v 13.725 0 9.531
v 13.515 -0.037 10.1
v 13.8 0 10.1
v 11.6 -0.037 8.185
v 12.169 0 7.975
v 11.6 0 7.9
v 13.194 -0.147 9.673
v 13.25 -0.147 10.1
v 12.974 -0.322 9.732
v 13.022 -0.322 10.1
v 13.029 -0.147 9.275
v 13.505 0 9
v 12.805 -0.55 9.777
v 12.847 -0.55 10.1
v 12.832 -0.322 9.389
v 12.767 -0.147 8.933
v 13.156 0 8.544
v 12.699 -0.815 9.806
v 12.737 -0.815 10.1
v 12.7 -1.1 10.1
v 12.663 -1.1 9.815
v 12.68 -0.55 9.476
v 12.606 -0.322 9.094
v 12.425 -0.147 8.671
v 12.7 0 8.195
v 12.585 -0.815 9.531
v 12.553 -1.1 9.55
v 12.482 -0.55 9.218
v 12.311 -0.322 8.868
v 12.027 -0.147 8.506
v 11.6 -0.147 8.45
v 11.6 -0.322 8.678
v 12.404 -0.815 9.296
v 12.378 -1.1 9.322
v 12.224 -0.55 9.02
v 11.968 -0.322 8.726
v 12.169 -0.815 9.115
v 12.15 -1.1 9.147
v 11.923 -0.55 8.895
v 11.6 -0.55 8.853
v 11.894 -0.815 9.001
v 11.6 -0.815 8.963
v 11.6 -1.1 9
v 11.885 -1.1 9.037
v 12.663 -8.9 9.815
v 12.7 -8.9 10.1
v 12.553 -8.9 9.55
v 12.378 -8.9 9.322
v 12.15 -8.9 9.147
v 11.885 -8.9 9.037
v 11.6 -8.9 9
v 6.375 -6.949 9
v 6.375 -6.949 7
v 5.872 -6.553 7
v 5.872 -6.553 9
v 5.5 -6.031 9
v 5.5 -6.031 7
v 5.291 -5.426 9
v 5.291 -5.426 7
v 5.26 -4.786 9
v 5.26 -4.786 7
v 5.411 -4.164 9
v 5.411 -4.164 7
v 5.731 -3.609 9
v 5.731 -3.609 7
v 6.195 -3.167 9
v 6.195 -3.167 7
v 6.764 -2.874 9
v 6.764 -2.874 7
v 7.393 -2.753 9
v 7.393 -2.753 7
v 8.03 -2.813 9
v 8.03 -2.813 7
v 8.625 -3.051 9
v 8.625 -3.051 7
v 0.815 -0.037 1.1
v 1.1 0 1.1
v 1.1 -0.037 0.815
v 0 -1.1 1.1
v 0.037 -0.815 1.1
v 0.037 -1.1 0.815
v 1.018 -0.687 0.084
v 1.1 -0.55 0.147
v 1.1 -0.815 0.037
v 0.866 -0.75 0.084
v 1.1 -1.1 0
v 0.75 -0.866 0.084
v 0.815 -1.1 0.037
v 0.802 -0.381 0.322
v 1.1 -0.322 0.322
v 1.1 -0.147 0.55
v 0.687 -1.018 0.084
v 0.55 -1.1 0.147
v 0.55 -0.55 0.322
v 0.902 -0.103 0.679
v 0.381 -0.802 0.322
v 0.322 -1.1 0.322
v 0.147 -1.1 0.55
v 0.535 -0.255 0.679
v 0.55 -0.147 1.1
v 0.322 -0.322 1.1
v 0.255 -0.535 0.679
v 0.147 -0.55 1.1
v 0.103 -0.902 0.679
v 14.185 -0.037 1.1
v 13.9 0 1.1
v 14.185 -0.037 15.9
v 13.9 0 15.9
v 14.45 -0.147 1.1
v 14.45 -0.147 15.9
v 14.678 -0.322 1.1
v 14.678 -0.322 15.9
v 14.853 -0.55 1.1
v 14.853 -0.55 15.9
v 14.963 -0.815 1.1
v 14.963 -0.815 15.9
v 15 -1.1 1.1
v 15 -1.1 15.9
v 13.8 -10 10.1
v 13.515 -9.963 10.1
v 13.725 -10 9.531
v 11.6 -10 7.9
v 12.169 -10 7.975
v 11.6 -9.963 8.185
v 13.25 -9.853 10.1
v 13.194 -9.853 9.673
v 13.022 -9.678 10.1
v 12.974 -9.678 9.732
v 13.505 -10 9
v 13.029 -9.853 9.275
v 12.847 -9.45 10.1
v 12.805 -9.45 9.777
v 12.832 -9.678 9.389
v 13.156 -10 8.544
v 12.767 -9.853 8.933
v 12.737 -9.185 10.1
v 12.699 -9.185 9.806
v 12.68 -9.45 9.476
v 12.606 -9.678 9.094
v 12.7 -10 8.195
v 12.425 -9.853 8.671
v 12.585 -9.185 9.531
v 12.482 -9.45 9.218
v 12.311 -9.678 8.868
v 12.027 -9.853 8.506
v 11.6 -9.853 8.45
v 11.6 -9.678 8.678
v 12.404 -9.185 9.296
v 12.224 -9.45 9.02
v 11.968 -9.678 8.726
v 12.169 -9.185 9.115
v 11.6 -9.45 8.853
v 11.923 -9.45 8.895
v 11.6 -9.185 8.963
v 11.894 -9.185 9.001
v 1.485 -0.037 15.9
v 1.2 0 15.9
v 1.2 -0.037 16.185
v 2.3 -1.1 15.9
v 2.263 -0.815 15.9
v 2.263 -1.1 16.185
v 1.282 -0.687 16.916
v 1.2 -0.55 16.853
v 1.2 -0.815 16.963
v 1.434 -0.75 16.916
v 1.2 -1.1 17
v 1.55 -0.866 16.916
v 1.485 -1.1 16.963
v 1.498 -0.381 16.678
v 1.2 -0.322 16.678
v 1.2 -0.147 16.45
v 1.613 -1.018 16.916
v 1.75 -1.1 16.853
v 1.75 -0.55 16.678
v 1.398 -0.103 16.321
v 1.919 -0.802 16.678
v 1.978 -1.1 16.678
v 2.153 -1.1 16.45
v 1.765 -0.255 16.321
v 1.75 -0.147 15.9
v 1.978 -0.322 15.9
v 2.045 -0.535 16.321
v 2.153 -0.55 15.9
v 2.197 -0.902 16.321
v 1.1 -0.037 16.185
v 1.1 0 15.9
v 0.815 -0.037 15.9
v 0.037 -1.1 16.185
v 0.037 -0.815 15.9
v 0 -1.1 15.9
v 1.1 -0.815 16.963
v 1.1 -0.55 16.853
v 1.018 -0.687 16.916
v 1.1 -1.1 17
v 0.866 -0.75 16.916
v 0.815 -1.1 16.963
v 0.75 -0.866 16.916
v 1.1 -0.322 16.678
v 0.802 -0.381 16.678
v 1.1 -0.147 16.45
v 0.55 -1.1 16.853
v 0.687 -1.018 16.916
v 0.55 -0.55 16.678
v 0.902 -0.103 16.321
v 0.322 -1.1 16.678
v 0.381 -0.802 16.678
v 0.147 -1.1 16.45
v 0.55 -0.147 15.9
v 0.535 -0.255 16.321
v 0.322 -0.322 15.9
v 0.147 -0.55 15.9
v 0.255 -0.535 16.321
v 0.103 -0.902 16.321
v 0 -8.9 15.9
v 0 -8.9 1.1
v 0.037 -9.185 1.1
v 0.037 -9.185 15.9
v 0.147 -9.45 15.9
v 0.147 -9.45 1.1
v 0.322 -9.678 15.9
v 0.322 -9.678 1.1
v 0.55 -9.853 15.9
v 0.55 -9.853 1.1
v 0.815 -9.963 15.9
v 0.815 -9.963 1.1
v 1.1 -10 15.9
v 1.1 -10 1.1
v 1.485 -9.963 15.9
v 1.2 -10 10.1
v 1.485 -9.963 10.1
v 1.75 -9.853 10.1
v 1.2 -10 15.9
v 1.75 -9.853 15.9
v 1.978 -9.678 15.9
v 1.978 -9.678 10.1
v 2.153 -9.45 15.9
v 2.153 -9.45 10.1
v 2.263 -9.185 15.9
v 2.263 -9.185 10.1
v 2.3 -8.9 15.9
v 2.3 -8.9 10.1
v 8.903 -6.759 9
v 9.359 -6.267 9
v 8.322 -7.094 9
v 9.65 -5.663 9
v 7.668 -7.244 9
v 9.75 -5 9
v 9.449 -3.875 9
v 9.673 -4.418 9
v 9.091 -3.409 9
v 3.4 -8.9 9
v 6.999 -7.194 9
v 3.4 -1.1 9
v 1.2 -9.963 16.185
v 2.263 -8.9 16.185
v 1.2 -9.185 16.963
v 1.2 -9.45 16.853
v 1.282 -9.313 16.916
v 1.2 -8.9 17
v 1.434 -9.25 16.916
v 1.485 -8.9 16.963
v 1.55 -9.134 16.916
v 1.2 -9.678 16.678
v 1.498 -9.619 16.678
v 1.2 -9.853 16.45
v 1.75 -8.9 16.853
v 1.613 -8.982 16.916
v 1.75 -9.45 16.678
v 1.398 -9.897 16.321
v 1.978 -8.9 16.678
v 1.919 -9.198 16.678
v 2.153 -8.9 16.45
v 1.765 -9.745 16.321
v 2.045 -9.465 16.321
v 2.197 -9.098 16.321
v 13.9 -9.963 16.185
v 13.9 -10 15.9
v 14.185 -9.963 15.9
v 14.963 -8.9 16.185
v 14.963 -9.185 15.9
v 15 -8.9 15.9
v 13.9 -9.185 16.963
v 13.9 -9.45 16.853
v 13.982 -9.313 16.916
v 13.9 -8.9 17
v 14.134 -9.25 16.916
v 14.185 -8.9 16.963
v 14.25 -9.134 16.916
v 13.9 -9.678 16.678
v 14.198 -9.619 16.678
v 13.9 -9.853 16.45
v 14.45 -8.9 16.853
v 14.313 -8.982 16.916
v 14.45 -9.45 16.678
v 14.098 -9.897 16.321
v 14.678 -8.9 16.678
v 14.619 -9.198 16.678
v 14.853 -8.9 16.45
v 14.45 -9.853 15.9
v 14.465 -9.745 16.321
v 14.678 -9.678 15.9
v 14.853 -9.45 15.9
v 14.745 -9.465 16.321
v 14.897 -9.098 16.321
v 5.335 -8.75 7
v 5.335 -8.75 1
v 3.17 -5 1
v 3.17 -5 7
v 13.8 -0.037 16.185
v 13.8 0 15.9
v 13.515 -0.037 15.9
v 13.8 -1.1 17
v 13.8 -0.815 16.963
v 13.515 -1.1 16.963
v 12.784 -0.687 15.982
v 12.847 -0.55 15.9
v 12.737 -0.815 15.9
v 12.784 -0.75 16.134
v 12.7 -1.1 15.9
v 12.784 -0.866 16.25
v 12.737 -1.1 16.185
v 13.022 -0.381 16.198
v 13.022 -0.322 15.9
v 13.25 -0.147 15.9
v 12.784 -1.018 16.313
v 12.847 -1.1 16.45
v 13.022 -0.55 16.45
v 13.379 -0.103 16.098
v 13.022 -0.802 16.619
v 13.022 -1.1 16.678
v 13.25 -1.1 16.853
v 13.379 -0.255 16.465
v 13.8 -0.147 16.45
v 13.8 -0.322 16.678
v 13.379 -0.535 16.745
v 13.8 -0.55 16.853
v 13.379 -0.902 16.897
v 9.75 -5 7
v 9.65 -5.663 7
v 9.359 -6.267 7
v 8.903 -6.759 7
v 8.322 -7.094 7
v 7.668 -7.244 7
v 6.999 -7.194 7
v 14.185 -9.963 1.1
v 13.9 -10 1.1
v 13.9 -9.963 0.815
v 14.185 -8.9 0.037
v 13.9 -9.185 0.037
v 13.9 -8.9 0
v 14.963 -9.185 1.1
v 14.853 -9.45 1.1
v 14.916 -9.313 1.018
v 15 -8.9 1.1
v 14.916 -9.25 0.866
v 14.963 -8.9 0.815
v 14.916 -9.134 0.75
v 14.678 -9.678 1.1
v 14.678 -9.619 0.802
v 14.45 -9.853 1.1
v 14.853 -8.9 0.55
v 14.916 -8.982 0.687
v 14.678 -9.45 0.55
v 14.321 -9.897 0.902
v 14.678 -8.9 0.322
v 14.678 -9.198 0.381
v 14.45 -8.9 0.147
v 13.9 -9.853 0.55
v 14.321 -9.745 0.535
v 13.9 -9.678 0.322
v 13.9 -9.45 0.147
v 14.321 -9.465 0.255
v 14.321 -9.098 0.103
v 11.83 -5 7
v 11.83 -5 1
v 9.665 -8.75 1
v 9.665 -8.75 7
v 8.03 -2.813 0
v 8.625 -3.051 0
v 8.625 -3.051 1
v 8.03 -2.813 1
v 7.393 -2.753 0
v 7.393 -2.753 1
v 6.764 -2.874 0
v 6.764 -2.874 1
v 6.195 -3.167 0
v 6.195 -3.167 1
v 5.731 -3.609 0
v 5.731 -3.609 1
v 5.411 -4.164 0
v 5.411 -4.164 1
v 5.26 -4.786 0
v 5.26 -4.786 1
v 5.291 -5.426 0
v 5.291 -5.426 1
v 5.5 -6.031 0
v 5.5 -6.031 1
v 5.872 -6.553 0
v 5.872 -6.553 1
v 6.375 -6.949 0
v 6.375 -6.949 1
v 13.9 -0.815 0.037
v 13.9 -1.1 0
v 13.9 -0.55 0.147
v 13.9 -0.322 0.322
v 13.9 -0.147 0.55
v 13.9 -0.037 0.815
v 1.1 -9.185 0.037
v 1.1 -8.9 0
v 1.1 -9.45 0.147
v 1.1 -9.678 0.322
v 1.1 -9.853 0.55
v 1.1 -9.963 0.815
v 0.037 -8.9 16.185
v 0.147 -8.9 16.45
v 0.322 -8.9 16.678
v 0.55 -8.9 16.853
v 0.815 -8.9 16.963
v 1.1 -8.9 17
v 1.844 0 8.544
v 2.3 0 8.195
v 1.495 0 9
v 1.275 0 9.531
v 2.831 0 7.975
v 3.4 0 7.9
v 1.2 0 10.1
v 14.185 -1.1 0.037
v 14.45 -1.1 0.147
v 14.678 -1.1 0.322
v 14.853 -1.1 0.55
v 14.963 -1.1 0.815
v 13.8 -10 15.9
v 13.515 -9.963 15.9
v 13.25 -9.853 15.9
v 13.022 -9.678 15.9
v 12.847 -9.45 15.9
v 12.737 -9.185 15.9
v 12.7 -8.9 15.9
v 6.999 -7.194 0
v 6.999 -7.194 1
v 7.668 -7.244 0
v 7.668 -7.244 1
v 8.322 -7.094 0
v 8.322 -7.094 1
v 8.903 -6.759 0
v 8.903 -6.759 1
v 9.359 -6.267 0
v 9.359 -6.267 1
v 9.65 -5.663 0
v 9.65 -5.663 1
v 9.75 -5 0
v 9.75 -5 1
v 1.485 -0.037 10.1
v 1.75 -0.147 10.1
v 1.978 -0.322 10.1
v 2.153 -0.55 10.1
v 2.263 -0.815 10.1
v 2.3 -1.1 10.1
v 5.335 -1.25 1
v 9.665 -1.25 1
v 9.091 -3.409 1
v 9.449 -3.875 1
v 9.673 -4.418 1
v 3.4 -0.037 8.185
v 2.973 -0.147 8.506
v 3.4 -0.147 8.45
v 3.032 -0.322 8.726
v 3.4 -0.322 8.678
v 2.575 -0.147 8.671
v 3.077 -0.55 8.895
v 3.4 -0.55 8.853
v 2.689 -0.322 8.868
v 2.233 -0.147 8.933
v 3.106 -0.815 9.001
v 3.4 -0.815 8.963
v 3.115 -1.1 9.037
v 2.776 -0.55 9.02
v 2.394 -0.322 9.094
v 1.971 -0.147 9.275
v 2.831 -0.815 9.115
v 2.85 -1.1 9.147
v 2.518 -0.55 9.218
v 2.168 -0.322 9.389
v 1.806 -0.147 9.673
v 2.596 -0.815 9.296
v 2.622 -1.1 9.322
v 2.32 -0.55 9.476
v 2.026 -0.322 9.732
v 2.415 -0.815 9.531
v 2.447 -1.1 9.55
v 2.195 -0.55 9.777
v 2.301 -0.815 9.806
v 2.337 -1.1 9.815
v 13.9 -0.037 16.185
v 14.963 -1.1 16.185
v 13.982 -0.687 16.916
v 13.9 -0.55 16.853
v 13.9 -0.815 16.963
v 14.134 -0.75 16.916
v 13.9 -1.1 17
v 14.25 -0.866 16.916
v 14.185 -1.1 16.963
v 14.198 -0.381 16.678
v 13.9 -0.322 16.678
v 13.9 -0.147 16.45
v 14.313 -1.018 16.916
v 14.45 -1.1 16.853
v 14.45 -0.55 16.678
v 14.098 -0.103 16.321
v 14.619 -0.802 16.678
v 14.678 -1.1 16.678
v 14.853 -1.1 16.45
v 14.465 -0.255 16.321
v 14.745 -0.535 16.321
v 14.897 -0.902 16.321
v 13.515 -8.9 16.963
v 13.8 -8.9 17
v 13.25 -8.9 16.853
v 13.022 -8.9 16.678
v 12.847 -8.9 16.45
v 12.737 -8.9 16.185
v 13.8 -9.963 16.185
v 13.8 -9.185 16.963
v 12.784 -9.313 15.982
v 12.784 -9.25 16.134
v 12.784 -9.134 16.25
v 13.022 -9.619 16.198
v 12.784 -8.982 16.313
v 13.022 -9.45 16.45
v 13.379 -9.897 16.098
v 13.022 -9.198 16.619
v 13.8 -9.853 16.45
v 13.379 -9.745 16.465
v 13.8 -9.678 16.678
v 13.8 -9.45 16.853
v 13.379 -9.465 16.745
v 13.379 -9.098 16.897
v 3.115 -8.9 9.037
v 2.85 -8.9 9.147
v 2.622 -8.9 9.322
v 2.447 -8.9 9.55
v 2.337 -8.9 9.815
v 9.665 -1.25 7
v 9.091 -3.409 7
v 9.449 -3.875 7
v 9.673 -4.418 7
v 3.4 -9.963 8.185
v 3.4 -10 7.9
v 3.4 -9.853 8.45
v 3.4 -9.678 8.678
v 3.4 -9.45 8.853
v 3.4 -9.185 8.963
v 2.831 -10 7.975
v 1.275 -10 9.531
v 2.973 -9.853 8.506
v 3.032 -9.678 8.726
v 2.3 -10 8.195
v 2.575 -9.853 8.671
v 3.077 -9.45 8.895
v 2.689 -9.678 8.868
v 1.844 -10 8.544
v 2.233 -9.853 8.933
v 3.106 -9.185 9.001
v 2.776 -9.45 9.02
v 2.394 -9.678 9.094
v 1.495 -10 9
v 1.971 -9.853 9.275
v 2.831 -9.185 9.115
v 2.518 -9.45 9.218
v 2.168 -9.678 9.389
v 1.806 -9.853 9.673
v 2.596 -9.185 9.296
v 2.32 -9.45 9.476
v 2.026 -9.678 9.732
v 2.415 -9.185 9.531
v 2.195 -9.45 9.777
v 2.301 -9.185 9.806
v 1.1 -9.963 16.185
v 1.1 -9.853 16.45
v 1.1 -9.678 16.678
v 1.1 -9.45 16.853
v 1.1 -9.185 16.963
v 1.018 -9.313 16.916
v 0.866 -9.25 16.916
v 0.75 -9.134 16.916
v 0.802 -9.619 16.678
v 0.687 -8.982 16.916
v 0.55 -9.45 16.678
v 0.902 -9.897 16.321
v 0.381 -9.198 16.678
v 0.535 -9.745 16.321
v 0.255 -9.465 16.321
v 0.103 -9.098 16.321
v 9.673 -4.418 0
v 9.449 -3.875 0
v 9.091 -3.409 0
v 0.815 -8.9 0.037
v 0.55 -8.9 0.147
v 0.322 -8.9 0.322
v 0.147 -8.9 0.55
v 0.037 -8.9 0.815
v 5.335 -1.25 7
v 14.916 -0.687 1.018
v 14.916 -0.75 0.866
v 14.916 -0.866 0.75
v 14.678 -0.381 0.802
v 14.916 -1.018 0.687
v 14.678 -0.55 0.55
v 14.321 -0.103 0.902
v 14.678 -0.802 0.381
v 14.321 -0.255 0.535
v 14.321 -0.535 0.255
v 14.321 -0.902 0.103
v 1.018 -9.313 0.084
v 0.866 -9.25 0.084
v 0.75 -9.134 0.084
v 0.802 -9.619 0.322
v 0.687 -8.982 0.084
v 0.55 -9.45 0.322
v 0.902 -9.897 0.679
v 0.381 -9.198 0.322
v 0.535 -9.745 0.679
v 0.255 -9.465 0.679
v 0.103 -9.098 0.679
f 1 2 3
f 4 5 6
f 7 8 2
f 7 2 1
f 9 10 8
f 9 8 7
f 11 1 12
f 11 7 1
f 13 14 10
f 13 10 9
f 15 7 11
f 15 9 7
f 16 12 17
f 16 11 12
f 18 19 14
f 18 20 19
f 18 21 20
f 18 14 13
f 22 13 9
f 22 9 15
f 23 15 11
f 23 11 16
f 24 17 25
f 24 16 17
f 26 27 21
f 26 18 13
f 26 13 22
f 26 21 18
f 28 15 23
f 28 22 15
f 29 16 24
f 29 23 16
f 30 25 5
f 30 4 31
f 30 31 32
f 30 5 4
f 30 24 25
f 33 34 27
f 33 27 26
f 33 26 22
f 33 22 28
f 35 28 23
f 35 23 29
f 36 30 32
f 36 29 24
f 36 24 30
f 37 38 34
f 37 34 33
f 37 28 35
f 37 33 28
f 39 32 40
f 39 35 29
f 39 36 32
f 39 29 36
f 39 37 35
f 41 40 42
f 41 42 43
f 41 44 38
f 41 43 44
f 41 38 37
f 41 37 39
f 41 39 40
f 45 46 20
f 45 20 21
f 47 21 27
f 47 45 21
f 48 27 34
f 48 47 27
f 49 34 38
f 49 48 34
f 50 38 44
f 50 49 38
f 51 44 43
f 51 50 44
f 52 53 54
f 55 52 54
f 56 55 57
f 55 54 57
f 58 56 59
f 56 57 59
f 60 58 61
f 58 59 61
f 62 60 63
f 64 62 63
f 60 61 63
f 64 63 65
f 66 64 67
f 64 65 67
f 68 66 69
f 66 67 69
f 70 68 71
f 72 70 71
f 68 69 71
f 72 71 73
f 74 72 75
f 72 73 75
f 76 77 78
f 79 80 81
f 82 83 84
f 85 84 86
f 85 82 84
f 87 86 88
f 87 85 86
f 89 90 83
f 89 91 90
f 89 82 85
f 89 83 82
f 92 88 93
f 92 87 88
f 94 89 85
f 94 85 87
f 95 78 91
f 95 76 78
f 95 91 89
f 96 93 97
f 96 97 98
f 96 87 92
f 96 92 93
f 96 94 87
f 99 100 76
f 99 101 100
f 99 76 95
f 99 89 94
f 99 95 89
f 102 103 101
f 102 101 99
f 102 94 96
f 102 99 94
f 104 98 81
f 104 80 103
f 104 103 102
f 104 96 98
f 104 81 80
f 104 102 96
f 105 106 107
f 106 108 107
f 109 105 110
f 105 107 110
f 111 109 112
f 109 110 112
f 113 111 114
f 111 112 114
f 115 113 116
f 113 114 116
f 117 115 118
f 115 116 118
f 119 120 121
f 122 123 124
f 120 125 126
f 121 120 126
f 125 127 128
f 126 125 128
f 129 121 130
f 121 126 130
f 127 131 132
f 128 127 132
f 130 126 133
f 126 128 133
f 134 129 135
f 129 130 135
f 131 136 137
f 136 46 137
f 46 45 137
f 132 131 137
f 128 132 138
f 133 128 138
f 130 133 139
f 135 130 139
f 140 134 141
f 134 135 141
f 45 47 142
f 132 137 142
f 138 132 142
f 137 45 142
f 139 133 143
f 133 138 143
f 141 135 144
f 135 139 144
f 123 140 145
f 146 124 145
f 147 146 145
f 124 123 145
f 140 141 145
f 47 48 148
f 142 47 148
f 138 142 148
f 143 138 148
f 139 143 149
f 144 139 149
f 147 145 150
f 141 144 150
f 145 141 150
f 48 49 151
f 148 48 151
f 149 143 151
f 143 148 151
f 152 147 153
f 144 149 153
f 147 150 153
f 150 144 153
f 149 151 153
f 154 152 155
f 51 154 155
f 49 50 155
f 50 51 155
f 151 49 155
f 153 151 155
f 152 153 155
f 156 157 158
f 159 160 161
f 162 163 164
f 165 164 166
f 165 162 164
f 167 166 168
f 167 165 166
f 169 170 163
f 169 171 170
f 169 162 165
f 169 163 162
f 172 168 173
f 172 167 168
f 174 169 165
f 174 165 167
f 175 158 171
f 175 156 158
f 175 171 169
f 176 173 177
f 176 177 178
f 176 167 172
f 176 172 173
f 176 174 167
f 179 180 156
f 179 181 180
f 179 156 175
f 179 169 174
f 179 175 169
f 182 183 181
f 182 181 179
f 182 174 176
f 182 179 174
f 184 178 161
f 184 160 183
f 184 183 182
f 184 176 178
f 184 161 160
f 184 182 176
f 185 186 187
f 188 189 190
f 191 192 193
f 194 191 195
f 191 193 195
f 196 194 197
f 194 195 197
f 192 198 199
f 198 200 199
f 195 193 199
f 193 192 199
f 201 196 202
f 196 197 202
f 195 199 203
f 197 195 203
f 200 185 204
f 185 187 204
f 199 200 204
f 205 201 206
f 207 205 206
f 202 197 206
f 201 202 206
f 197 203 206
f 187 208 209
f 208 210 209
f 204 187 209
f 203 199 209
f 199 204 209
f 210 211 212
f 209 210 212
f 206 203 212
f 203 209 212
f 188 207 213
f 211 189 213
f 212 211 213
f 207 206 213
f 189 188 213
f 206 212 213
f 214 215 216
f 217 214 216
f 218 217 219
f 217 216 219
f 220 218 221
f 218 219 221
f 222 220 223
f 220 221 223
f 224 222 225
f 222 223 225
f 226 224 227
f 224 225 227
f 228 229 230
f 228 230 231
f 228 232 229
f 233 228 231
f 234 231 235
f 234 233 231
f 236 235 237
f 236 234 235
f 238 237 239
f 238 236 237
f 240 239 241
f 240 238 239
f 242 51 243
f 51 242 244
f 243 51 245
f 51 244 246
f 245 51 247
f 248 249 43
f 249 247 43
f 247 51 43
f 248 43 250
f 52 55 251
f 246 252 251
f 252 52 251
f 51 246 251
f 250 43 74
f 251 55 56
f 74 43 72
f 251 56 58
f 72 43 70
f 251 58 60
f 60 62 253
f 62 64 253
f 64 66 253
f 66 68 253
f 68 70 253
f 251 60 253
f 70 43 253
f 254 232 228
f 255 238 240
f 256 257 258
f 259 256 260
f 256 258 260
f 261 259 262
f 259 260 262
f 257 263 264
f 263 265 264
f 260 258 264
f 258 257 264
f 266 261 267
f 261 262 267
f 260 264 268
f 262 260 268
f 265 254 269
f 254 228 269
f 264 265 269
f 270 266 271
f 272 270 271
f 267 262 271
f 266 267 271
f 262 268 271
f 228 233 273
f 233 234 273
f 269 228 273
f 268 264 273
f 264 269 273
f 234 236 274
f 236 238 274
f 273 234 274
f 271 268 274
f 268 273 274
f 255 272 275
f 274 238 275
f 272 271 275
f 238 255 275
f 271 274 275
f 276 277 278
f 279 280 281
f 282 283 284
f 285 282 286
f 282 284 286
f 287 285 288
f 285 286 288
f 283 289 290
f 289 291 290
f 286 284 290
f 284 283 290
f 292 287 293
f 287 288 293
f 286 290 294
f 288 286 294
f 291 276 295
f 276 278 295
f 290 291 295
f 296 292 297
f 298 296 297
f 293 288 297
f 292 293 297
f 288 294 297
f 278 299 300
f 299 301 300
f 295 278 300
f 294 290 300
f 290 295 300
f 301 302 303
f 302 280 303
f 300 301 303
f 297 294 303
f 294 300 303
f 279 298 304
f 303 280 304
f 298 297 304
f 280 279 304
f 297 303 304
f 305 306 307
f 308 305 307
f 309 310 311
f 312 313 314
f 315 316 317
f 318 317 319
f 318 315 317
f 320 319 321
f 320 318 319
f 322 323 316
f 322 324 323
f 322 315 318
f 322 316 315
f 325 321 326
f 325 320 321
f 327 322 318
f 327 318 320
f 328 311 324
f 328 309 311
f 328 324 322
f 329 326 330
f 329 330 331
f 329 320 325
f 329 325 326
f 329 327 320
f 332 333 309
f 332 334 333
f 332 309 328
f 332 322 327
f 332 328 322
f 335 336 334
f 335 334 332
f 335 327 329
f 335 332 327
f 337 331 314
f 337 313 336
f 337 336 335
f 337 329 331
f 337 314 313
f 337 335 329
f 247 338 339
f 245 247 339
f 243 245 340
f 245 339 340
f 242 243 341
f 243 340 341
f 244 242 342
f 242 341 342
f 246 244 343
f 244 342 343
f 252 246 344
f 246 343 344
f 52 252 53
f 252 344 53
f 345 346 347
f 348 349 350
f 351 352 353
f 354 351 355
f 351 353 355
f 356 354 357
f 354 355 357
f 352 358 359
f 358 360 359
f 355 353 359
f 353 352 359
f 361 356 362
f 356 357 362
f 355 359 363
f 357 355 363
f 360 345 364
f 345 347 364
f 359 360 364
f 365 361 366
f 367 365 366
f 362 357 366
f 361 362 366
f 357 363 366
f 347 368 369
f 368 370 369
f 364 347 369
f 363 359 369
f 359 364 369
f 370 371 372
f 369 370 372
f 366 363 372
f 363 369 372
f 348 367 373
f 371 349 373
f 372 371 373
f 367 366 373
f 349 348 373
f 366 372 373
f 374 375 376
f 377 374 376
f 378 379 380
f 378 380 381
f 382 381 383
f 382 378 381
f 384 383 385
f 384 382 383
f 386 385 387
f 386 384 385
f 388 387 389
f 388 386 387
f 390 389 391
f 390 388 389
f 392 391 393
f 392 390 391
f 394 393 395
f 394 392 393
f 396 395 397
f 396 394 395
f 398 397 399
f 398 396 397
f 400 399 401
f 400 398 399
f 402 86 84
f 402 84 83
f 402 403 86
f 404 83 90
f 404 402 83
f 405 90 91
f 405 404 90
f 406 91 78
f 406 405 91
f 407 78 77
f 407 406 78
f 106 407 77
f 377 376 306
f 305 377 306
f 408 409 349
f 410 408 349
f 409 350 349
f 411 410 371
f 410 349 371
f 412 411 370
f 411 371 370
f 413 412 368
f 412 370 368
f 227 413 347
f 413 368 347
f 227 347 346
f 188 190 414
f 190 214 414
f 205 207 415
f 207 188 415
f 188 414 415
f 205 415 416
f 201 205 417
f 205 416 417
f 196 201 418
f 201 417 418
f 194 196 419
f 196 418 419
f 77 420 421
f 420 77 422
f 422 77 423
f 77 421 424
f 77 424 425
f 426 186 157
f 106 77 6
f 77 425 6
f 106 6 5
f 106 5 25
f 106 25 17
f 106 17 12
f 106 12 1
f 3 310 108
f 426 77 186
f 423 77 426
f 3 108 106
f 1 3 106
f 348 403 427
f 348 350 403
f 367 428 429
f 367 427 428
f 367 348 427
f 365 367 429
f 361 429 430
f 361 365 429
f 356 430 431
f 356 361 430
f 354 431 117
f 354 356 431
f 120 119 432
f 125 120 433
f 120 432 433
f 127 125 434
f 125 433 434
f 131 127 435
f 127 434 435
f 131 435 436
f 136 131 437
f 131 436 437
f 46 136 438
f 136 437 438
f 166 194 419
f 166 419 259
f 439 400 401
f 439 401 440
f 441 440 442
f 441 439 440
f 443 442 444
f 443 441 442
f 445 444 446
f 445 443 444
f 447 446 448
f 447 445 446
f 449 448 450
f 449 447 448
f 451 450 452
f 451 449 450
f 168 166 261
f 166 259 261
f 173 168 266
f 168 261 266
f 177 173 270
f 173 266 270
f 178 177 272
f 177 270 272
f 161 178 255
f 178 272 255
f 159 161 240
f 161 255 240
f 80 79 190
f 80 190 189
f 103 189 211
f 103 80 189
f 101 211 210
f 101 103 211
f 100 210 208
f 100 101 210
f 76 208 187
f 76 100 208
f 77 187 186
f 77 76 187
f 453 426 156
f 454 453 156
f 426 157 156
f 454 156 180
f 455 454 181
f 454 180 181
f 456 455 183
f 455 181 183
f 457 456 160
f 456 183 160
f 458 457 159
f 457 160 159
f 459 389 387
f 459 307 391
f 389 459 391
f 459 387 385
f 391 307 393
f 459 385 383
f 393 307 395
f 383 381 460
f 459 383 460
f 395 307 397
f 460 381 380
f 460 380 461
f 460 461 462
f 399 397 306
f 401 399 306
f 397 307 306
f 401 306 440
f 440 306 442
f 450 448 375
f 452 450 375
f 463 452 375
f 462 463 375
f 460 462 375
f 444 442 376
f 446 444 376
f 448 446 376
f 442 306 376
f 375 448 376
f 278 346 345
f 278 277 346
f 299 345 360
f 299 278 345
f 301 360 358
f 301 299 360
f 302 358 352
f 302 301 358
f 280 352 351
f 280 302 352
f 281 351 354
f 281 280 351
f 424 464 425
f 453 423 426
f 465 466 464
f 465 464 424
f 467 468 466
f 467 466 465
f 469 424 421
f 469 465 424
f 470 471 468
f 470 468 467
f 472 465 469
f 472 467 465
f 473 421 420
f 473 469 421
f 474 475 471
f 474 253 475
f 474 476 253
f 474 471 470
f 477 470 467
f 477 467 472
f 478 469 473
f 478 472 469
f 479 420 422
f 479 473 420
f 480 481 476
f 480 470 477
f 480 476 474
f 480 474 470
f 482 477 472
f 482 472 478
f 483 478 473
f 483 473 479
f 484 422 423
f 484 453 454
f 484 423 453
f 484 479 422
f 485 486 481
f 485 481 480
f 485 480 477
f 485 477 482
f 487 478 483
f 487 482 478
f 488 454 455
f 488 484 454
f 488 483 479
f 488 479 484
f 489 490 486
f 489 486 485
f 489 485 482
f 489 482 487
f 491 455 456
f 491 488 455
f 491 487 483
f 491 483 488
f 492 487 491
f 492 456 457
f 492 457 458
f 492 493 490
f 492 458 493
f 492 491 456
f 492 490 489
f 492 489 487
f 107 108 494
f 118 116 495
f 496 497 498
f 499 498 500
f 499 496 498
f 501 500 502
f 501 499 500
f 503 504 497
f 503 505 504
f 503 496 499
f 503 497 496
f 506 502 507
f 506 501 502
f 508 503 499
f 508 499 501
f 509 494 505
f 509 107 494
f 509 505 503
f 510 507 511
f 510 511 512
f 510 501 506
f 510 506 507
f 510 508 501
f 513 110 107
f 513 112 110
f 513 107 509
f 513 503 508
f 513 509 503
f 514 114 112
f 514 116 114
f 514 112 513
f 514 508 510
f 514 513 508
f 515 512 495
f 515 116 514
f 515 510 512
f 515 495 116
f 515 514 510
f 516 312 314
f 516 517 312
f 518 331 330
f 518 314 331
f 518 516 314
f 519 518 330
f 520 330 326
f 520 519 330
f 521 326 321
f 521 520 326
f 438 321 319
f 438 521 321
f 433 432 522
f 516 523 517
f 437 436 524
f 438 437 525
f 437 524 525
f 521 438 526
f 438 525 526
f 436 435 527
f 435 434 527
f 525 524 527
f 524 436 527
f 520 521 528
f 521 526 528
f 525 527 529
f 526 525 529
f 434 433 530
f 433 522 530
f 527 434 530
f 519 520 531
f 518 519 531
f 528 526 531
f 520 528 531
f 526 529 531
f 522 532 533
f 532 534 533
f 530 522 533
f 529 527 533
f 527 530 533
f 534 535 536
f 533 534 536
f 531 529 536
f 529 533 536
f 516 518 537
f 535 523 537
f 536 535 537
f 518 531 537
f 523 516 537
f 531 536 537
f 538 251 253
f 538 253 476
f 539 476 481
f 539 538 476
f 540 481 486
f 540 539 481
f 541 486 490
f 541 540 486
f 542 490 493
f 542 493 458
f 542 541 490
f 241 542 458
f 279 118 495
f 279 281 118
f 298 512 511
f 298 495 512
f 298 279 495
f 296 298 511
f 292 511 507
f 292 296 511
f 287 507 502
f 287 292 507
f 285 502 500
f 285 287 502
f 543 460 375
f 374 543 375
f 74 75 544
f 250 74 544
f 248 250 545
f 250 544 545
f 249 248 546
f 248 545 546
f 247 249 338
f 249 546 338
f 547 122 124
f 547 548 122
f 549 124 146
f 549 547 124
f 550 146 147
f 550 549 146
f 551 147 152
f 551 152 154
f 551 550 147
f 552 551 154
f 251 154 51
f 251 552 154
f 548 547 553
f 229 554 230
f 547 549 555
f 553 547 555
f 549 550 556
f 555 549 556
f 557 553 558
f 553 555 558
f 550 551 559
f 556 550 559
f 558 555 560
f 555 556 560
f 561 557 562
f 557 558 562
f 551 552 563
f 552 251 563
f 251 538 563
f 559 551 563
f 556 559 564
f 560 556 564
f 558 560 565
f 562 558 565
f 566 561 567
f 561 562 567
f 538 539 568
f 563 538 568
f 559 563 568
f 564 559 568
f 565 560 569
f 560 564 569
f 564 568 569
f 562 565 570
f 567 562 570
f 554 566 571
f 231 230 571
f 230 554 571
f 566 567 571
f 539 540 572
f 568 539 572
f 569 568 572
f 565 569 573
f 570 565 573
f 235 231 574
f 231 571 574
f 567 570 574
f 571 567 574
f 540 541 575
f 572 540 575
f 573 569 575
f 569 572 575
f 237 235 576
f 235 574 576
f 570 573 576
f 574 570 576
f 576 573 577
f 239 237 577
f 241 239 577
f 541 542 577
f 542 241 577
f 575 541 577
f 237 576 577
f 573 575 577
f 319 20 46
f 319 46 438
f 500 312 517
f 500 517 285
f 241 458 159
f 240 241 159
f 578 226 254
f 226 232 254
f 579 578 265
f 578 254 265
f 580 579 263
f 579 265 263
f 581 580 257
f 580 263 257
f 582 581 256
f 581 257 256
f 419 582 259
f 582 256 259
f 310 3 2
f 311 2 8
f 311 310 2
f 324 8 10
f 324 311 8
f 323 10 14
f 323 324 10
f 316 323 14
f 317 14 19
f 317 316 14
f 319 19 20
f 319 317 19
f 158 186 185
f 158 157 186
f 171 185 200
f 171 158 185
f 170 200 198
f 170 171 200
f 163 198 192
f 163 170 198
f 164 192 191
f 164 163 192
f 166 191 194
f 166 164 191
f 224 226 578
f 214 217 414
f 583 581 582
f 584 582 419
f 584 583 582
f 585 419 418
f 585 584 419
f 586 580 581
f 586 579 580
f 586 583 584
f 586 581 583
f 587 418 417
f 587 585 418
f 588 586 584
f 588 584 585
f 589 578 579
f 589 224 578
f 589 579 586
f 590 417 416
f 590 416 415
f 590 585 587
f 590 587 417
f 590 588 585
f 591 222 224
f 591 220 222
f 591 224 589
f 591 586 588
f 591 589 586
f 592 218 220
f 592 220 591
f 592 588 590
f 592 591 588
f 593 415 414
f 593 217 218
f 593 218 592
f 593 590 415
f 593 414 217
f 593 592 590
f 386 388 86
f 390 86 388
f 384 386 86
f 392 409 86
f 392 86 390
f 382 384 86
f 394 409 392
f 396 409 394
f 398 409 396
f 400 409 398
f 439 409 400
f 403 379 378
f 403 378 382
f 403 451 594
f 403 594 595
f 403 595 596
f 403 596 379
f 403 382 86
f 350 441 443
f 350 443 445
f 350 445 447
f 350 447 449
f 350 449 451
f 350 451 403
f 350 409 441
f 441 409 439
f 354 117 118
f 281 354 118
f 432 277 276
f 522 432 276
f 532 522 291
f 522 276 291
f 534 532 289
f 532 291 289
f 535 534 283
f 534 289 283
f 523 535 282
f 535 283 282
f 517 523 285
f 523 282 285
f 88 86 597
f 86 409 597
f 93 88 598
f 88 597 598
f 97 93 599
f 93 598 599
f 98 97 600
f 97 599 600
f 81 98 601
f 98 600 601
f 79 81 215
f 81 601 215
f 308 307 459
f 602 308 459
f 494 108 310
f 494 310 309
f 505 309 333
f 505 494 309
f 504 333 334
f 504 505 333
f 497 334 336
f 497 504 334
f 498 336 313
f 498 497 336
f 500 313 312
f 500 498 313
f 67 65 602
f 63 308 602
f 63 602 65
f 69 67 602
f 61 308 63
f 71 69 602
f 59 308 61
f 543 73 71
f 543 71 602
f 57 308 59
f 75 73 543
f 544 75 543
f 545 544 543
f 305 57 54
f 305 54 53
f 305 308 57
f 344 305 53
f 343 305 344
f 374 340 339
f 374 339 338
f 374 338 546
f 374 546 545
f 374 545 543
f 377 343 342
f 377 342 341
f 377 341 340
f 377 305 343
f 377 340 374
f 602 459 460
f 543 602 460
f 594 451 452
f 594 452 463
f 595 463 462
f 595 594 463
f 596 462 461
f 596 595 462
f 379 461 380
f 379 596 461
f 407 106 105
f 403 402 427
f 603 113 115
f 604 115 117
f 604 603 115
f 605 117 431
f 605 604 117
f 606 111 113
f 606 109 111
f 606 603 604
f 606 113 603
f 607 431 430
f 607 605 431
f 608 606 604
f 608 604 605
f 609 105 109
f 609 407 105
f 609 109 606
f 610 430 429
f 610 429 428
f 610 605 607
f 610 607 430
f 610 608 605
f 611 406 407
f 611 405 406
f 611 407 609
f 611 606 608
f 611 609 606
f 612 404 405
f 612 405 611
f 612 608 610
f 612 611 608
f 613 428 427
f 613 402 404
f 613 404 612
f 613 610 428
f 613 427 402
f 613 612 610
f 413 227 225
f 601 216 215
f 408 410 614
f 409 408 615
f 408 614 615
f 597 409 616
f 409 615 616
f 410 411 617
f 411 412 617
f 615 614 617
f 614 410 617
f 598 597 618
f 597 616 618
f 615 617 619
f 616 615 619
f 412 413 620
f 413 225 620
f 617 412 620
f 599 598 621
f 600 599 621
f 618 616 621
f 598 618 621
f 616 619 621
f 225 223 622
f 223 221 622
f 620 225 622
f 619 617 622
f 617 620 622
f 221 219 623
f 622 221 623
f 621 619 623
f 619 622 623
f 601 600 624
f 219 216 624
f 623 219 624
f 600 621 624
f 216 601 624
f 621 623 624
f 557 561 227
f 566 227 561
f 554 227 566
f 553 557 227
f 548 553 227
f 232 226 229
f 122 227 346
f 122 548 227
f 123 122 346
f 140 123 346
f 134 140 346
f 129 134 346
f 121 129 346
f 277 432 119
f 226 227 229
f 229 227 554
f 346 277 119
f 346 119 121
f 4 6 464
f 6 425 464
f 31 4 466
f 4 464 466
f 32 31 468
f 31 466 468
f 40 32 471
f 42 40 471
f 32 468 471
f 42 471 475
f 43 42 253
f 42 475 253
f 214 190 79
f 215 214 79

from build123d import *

# Parameters (mm, degrees)
F0_W     = 2.3
F0_H     = 8
F1_DEPTH = 10
F3_DEPTH = 17.001
F4_DEPTH = 7
F5_DEPTH = 1
F6_R     = 1.1


with BuildPart() as f1:
    # F0 (on Front) → F1 (new body)
    with BuildSketch(Plane.XZ):
        with Locations((1.15, 13)):
            Rectangle(F0_W, F0_H)
        Polygon((0, 9), (0, 0), (15, 0), (15, 9), (12.7, 9), (2.3, 9), align=None)
        with Locations((13.85, 13)):
            Rectangle(F0_W, F0_H)
    extrude(amount=F1_DEPTH)

    # F2 (on face) → F3 (cut, through all)
    with BuildSketch(Plane(origin=(0, 0, 0), x_dir=(1, 0, 0), z_dir=(0, 0, -1))):
        with BuildLine():
            Line((8.625, 3.0514428415), (6.375, 6.9485571585))
            ThreePointArc((6.375, 6.9485571585), (5.5514428415, 3.875), (8.625, 3.0514428415))
        make_face()
        with BuildLine():
            ThreePointArc((8.625, 3.0514428415), (9.4485571585, 3.875), (9.75, 5))
            ThreePointArc((9.75, 5), (8.625, 6.9485571585), (6.375, 6.9485571585))
            Line((6.375, 6.9485571585), (8.625, 3.0514428415))
        make_face()
    extrude(amount=-F3_DEPTH, mode=Mode.SUBTRACT)

    # F2 (on face) → F4 (cut)
    with BuildSketch(Plane(origin=(0, 0, 0), x_dir=(1, 0, 0), z_dir=(0, 0, -1))):
        with BuildLine():
            ThreePointArc((8.625, 3.0514428415), (5.5514428415, 3.875), (6.375, 6.9485571585))
            Line((6.375, 6.9485571585), (5.3349364905, 8.75))
            Line((5.3349364905, 8.75), (3.1698729811, 5))
            Line((3.1698729811, 5), (5.3349364905, 1.25))
            Line((5.3349364905, 1.25), (9.6650635095, 1.25))
            Line((9.6650635095, 1.25), (8.625, 3.0514428415))
        make_face()
        with BuildLine():
            ThreePointArc((6.375, 6.9485571585), (8.625, 6.9485571585), (9.75, 5))
            ThreePointArc((9.75, 5), (9.4485571585, 3.875), (8.625, 3.0514428415))
            Line((8.625, 3.0514428415), (9.6650635095, 1.25))
            Line((9.6650635095, 1.25), (11.8301270189, 5))
            Line((11.8301270189, 5), (9.6650635095, 8.75))
            Line((9.6650635095, 8.75), (5.3349364905, 8.75))
            Line((5.3349364905, 8.75), (6.375, 6.9485571585))
        make_face()
    extrude(amount=-F4_DEPTH, mode=Mode.SUBTRACT)

    # F2 (on face) → F5 (join)
    with BuildSketch(Plane(origin=(0, 0, 0), x_dir=(1, 0, 0), z_dir=(0, 0, -1))):
        with BuildLine():
            ThreePointArc((8.625, 3.0514428415), (5.5514428415, 3.875), (6.375, 6.9485571585))
            Line((6.375, 6.9485571585), (5.3349364905, 8.75))
            Line((5.3349364905, 8.75), (3.1698729811, 5))
            Line((3.1698729811, 5), (5.3349364905, 1.25))
            Line((5.3349364905, 1.25), (9.6650635095, 1.25))
            Line((9.6650635095, 1.25), (8.625, 3.0514428415))
        make_face()
        with BuildLine():
            ThreePointArc((6.375, 6.9485571585), (8.625, 6.9485571585), (9.75, 5))
            ThreePointArc((9.75, 5), (9.4485571585, 3.875), (8.625, 3.0514428415))
            Line((8.625, 3.0514428415), (9.6650635095, 1.25))
            Line((9.6650635095, 1.25), (11.8301270189, 5))
            Line((11.8301270189, 5), (9.6650635095, 8.75))
            Line((9.6650635095, 8.75), (5.3349364905, 8.75))
            Line((5.3349364905, 8.75), (6.375, 6.9485571585))
        make_face()
    extrude(amount=-F5_DEPTH)

    # F6
    f6_edges = [f1.edges().sort_by_distance(p)[0] for p in [
        (0, 0, 8.5),
        (7.5, 0, 0),
        (15, 0, 8.5),
        (13.85, 0, 17),
        (12.7, 0, 13),
        (7.5, 0, 9),
        (2.3, 0, 13),
        (1.15, 0, 17),
        (0, -10, 8.5),
        (7.5, -10, 0),
        (15, -10, 8.5),
        (13.85, -10, 17),
        (12.7, -10, 13),
        (7.5, -10, 9),
        (2.3, -10, 13),
        (1.15, -10, 17),
        (15, -5, 0),
        (15, -5, 17),
        (0, -5, 17),
        (0, -5, 0),
        (12.7, -5, 17),
        (12.7, -5, 9),
        (2.3, -5, 9),
        (2.3, -5, 17),
    ]]
    fillet(f6_edges, radius=F6_R)


solid = f1.part
